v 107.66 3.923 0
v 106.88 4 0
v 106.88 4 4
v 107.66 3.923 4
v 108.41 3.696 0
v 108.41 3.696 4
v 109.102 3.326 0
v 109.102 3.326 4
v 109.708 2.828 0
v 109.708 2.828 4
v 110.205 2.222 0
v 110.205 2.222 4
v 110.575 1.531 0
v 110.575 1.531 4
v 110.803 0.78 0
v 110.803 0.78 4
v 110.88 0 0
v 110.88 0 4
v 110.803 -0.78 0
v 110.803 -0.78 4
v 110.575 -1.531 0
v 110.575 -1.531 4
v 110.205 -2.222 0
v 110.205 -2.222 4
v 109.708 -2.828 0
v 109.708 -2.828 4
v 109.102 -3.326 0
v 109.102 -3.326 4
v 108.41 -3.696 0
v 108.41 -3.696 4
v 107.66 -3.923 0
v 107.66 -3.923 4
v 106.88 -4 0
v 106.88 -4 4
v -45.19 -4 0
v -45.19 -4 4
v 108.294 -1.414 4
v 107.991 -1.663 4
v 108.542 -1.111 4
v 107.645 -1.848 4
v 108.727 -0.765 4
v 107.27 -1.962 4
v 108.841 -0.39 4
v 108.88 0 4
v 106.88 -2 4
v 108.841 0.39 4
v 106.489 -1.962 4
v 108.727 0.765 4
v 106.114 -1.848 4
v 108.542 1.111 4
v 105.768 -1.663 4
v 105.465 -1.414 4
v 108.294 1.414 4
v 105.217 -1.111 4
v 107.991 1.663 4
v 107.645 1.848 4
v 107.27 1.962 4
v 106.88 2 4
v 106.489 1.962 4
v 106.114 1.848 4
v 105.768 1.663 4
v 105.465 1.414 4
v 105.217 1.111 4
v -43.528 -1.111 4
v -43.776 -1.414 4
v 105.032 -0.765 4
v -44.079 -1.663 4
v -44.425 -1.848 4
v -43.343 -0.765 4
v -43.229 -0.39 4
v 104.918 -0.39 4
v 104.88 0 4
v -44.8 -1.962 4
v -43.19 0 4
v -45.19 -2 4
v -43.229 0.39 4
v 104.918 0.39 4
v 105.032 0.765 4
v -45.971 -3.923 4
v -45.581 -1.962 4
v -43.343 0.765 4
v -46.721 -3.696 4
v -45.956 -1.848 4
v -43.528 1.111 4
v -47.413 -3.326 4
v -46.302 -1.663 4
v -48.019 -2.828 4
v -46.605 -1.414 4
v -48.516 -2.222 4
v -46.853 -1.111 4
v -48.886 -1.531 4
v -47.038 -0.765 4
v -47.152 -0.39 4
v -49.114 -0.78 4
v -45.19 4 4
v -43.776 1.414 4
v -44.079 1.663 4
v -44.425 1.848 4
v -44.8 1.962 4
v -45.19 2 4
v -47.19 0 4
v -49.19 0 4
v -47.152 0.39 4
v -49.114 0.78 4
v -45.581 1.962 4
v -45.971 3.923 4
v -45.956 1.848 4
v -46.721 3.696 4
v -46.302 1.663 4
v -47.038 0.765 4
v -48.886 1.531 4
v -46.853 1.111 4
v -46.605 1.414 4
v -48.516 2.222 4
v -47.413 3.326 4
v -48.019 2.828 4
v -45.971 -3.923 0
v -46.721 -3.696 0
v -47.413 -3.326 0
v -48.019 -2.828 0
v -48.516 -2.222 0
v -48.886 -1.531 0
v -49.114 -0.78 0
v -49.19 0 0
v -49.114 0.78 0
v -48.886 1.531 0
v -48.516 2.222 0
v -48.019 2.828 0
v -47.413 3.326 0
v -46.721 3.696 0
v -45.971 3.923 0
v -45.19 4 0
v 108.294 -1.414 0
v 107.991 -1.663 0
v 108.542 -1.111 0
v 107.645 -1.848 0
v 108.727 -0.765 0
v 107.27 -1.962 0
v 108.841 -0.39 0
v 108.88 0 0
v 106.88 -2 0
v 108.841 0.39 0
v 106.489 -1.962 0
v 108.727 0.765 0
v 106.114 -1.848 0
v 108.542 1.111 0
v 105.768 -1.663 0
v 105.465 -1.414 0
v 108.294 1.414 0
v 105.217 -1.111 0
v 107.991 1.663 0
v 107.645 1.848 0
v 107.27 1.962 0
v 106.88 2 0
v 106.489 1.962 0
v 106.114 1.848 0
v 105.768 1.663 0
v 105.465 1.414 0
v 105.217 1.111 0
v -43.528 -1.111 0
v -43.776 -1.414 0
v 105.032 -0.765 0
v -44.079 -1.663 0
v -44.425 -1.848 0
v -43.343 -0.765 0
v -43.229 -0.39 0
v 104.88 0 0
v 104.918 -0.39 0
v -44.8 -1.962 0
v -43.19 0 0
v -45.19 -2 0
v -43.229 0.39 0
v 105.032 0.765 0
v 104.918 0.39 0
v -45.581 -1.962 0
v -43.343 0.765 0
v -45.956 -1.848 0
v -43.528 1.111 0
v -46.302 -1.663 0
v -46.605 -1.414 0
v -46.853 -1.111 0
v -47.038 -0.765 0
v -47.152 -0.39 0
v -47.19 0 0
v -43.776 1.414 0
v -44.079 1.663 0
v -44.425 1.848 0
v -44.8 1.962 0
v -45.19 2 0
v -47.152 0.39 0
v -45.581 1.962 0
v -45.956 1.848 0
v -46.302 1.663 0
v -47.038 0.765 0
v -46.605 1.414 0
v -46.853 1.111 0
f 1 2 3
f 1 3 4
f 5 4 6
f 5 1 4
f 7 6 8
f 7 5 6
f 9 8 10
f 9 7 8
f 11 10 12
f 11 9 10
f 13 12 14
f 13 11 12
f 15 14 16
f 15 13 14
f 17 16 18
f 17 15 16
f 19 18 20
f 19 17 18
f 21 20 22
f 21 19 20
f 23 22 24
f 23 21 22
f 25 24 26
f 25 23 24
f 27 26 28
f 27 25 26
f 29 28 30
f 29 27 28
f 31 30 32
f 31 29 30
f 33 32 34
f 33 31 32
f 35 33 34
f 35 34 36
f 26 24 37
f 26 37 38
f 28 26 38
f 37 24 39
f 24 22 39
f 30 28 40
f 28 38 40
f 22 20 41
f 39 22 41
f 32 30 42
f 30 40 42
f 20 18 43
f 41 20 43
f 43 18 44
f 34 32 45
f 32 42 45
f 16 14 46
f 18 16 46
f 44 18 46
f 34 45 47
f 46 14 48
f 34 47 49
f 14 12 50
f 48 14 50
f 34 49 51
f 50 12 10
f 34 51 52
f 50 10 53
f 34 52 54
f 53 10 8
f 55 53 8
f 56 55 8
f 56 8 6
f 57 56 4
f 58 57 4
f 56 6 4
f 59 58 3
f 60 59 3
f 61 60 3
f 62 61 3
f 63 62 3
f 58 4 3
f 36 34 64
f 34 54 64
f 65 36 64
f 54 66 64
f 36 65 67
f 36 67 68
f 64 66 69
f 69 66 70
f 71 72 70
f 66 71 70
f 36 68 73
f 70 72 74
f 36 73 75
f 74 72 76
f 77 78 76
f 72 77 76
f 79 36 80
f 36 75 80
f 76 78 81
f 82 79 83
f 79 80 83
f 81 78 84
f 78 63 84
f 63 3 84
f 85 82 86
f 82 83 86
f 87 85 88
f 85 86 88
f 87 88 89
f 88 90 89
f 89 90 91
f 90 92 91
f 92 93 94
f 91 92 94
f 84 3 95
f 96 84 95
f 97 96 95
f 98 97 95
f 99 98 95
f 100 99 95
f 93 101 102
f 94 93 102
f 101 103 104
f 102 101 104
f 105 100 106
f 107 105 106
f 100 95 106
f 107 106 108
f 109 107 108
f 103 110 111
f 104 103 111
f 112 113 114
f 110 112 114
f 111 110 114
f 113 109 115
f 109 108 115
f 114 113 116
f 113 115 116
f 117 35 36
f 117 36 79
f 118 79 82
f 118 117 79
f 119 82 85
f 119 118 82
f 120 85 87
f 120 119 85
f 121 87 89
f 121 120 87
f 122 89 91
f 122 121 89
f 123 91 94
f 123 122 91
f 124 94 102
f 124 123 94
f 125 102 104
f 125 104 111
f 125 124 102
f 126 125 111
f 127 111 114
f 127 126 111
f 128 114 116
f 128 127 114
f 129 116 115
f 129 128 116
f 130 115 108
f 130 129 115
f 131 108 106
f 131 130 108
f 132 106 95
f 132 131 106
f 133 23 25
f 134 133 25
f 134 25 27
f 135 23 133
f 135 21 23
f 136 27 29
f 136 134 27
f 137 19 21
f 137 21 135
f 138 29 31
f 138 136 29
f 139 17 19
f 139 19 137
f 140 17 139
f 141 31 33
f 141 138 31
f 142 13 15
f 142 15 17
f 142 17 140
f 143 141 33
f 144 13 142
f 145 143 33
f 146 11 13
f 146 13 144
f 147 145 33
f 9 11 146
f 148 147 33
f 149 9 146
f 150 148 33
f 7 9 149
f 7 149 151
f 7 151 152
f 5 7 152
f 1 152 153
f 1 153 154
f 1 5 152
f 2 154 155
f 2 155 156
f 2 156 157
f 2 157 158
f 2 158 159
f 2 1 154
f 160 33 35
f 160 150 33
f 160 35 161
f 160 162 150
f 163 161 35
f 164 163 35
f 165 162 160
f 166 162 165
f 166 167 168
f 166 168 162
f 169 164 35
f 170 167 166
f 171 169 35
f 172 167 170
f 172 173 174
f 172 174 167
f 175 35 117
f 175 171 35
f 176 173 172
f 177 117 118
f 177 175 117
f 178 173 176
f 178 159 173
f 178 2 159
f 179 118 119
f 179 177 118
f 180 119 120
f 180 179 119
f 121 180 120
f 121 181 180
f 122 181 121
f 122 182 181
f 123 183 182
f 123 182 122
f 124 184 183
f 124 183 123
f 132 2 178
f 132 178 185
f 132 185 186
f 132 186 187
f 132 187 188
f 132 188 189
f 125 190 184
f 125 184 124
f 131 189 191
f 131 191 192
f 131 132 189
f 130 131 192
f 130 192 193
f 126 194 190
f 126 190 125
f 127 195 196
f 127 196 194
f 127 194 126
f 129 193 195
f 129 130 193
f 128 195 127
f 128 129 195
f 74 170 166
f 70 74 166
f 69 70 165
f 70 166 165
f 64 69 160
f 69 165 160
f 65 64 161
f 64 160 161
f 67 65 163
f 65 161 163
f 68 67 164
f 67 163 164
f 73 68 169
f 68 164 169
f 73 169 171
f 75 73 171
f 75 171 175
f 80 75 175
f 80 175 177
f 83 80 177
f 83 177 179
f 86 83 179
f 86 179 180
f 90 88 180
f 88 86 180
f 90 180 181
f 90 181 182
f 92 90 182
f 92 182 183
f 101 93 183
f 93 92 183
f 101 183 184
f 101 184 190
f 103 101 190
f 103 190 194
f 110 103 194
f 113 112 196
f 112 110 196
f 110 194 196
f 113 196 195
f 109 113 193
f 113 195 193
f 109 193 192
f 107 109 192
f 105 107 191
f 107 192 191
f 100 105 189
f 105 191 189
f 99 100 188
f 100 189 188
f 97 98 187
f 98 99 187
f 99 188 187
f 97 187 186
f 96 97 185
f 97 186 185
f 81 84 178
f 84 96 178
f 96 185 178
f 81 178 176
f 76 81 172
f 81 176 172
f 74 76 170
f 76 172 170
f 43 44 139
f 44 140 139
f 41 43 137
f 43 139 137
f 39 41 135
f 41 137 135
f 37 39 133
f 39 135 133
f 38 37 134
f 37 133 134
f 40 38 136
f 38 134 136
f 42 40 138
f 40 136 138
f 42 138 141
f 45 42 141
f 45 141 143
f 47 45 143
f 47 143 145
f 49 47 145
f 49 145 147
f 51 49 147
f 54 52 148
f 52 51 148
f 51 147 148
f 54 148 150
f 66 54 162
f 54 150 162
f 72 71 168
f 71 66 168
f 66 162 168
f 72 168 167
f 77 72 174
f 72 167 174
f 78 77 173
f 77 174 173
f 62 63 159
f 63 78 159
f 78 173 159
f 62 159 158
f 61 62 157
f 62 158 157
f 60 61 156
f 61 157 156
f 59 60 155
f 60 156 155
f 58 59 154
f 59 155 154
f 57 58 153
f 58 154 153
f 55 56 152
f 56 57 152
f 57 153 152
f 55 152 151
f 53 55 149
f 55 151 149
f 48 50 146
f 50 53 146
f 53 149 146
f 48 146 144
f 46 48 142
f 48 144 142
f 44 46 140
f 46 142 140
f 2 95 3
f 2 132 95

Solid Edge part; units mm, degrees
sketch "Sketch1" plane through (0, 0, 0) normal (0, 0, 1) x (1, 0, 0)
  circle A0 centre (-45.1905, 0) radius 2
  circle A1 centre (106.8795, 0) radius 2
  line L0 (-45.1905, 4) -> (106.8795, 4)
  line L1 (106.8795, -4) -> (-45.1905, -4)
  arc A2 (-45.1905, -4) -> (-45.1905, 4) centre (-45.1905, 0) cw
  arc A3 (106.8795, 4) -> (106.8795, -4) centre (106.8795, 0) cw
extrude "Protrusion1" add sketch "Sketch1" along normal blind 4
